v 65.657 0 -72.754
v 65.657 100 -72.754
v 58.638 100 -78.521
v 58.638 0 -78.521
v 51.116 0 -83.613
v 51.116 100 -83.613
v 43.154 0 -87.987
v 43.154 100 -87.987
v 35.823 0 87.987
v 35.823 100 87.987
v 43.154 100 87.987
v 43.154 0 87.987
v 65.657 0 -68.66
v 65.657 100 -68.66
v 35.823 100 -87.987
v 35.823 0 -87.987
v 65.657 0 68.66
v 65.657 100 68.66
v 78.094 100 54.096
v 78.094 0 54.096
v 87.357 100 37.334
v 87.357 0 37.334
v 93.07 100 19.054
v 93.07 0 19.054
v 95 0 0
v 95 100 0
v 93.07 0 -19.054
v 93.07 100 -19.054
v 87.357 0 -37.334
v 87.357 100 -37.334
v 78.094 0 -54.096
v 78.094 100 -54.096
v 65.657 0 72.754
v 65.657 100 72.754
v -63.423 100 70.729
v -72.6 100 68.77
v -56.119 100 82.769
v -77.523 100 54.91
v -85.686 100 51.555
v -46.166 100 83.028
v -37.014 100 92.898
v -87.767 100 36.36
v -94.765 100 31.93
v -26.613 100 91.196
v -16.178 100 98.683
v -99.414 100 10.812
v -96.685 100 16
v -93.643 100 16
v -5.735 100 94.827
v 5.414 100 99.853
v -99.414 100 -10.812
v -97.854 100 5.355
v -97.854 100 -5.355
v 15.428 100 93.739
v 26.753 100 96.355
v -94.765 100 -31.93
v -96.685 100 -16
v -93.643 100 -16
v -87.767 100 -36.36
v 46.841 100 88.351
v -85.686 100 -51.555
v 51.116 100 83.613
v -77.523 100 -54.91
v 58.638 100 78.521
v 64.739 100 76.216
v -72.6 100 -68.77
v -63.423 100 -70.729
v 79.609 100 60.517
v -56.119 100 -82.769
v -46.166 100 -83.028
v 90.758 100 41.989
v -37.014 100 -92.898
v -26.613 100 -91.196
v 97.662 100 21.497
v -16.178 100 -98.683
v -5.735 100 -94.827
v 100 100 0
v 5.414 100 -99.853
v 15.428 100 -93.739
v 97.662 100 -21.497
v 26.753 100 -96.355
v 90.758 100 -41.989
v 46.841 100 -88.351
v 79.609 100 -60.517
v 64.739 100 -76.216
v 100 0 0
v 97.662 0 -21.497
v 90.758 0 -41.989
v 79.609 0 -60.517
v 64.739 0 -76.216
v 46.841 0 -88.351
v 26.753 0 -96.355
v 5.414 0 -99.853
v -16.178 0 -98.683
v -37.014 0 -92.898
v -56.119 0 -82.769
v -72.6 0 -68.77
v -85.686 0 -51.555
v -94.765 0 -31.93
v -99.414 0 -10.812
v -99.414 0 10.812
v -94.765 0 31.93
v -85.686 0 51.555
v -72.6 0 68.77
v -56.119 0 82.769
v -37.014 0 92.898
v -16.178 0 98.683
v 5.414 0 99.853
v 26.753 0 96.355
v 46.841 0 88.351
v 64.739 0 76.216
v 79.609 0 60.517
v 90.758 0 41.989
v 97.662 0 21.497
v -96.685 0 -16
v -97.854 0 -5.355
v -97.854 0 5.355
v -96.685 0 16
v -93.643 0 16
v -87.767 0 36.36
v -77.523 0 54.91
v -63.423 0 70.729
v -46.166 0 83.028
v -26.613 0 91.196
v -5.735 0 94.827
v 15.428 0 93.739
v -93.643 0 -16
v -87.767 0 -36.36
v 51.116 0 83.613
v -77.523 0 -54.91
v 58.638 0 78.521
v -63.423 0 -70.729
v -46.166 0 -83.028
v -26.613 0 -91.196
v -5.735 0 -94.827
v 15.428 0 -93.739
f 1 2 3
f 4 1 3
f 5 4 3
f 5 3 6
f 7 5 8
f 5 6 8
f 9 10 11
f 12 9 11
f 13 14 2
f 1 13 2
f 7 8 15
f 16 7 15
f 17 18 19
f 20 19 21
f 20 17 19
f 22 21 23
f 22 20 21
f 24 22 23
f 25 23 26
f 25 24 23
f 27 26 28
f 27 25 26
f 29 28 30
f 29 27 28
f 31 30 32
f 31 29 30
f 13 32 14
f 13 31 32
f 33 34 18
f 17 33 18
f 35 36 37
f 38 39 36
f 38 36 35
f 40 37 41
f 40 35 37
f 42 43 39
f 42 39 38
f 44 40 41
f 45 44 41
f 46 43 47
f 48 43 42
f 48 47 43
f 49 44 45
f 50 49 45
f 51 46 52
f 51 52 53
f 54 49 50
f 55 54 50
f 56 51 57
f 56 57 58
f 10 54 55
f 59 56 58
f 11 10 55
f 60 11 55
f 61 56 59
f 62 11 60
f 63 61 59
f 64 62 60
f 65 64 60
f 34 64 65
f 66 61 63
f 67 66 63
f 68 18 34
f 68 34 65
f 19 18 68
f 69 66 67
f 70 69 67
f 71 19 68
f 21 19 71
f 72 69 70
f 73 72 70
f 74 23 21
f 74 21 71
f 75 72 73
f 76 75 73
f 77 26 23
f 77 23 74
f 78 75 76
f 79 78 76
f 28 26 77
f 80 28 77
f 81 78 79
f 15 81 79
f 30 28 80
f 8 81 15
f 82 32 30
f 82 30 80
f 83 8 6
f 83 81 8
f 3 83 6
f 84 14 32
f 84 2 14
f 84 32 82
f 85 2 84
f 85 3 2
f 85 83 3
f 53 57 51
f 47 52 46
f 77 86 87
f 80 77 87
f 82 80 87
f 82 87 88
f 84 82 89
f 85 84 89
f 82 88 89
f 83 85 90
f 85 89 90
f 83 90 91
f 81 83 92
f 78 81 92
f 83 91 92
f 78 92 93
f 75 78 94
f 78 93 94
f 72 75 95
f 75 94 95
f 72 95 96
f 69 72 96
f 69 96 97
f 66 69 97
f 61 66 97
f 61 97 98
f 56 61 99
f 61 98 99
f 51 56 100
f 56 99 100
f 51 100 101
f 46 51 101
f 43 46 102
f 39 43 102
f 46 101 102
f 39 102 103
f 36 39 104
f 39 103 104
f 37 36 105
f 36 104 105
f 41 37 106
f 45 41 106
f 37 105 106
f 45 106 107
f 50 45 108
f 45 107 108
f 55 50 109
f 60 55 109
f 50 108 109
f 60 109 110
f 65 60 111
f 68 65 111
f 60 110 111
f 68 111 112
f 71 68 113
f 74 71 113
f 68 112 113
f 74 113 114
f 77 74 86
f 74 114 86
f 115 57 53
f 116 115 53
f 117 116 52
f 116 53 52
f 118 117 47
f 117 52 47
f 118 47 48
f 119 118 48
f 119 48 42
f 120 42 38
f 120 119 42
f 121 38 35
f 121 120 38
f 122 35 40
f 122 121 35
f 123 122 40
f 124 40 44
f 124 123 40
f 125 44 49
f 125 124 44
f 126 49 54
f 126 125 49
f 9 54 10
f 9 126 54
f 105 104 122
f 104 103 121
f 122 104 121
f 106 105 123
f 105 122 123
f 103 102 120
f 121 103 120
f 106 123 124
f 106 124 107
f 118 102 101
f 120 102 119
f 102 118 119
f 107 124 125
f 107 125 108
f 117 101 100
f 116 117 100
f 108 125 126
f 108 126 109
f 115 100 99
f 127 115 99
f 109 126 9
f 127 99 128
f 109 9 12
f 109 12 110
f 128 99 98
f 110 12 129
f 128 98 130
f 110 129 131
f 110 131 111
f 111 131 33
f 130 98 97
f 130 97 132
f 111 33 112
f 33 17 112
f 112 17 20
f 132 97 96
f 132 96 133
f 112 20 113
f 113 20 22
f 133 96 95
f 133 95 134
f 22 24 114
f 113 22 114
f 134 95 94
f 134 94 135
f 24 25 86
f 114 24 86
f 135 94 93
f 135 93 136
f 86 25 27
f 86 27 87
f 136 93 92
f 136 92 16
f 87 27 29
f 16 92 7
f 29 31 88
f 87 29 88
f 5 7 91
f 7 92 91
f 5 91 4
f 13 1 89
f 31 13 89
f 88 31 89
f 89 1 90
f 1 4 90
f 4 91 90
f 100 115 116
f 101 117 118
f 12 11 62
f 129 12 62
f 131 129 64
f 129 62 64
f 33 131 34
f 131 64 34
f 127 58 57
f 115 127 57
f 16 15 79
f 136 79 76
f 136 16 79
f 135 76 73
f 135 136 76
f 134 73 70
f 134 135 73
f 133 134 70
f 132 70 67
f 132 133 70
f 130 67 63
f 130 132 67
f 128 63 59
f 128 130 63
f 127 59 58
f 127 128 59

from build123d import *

# Parameters (mm, degrees)
SKETCH1_R           = 100
SKETCH1_R_2         = 95
BOSS_EXTRUDE1_DEPTH = 100
CUT_EXTRUDE1_DEPTH  = 101


with BuildPart() as part:
    # Sketch1 → Boss-Extrude1 (new body)
    with BuildSketch(Plane(origin=(0, 0, 0), x_dir=(1, 0, 0), z_dir=(0, 1, 0))):
        Circle(SKETCH1_R)
        Circle(SKETCH1_R_2, mode=Mode.SUBTRACT)
    extrude(amount=BOSS_EXTRUDE1_DEPTH)

    # Sketch2 → Cut-Extrude1 (cut, through all)
    with BuildSketch(Plane(origin=(0, 100, 0), x_dir=(1, 0, 0), z_dir=(0, 1, 0))):
        with BuildLine():
            ThreePointArc((65.656830535, 72.754248014), (54.935999613, 81.154395731), (43.154094517, 87.98706795))
            Line((43.154094517, 87.98706795), (35.82284011, 87.98706795))
            ThreePointArc((35.82284011, 87.98706795), (51.651871532, 79.731324881), (65.656830535, 68.659890795))
            Line((65.656830535, 68.659890795), (65.656830535, 72.754248014))
        make_face()
        with BuildLine():
            ThreePointArc((43.154094517, -87.98706795), (54.935999613, -81.154395731), (65.656830535, -72.754248014))
            Line((65.656830535, -72.754248014), (65.656830535, -68.659890795))
            ThreePointArc((65.656830535, -68.659890795), (51.651871532, -79.731324881), (35.82284011, -87.98706795))
            Line((35.82284011, -87.98706795), (43.154094517, -87.98706795))
        make_face()
        with BuildLine():
            Line((-93.642938869, 16), (-96.685055722, 16))
            ThreePointArc((-96.685055722, 16), (-98, 0), (-96.685055722, -16))
            Line((-96.685055722, -16), (-93.642938869, -16))
            ThreePointArc((-93.642938869, -16), (-95, 0), (-93.642938869, 16))
        make_face()
    extrude(amount=-CUT_EXTRUDE1_DEPTH, mode=Mode.SUBTRACT)


solid = part.part
